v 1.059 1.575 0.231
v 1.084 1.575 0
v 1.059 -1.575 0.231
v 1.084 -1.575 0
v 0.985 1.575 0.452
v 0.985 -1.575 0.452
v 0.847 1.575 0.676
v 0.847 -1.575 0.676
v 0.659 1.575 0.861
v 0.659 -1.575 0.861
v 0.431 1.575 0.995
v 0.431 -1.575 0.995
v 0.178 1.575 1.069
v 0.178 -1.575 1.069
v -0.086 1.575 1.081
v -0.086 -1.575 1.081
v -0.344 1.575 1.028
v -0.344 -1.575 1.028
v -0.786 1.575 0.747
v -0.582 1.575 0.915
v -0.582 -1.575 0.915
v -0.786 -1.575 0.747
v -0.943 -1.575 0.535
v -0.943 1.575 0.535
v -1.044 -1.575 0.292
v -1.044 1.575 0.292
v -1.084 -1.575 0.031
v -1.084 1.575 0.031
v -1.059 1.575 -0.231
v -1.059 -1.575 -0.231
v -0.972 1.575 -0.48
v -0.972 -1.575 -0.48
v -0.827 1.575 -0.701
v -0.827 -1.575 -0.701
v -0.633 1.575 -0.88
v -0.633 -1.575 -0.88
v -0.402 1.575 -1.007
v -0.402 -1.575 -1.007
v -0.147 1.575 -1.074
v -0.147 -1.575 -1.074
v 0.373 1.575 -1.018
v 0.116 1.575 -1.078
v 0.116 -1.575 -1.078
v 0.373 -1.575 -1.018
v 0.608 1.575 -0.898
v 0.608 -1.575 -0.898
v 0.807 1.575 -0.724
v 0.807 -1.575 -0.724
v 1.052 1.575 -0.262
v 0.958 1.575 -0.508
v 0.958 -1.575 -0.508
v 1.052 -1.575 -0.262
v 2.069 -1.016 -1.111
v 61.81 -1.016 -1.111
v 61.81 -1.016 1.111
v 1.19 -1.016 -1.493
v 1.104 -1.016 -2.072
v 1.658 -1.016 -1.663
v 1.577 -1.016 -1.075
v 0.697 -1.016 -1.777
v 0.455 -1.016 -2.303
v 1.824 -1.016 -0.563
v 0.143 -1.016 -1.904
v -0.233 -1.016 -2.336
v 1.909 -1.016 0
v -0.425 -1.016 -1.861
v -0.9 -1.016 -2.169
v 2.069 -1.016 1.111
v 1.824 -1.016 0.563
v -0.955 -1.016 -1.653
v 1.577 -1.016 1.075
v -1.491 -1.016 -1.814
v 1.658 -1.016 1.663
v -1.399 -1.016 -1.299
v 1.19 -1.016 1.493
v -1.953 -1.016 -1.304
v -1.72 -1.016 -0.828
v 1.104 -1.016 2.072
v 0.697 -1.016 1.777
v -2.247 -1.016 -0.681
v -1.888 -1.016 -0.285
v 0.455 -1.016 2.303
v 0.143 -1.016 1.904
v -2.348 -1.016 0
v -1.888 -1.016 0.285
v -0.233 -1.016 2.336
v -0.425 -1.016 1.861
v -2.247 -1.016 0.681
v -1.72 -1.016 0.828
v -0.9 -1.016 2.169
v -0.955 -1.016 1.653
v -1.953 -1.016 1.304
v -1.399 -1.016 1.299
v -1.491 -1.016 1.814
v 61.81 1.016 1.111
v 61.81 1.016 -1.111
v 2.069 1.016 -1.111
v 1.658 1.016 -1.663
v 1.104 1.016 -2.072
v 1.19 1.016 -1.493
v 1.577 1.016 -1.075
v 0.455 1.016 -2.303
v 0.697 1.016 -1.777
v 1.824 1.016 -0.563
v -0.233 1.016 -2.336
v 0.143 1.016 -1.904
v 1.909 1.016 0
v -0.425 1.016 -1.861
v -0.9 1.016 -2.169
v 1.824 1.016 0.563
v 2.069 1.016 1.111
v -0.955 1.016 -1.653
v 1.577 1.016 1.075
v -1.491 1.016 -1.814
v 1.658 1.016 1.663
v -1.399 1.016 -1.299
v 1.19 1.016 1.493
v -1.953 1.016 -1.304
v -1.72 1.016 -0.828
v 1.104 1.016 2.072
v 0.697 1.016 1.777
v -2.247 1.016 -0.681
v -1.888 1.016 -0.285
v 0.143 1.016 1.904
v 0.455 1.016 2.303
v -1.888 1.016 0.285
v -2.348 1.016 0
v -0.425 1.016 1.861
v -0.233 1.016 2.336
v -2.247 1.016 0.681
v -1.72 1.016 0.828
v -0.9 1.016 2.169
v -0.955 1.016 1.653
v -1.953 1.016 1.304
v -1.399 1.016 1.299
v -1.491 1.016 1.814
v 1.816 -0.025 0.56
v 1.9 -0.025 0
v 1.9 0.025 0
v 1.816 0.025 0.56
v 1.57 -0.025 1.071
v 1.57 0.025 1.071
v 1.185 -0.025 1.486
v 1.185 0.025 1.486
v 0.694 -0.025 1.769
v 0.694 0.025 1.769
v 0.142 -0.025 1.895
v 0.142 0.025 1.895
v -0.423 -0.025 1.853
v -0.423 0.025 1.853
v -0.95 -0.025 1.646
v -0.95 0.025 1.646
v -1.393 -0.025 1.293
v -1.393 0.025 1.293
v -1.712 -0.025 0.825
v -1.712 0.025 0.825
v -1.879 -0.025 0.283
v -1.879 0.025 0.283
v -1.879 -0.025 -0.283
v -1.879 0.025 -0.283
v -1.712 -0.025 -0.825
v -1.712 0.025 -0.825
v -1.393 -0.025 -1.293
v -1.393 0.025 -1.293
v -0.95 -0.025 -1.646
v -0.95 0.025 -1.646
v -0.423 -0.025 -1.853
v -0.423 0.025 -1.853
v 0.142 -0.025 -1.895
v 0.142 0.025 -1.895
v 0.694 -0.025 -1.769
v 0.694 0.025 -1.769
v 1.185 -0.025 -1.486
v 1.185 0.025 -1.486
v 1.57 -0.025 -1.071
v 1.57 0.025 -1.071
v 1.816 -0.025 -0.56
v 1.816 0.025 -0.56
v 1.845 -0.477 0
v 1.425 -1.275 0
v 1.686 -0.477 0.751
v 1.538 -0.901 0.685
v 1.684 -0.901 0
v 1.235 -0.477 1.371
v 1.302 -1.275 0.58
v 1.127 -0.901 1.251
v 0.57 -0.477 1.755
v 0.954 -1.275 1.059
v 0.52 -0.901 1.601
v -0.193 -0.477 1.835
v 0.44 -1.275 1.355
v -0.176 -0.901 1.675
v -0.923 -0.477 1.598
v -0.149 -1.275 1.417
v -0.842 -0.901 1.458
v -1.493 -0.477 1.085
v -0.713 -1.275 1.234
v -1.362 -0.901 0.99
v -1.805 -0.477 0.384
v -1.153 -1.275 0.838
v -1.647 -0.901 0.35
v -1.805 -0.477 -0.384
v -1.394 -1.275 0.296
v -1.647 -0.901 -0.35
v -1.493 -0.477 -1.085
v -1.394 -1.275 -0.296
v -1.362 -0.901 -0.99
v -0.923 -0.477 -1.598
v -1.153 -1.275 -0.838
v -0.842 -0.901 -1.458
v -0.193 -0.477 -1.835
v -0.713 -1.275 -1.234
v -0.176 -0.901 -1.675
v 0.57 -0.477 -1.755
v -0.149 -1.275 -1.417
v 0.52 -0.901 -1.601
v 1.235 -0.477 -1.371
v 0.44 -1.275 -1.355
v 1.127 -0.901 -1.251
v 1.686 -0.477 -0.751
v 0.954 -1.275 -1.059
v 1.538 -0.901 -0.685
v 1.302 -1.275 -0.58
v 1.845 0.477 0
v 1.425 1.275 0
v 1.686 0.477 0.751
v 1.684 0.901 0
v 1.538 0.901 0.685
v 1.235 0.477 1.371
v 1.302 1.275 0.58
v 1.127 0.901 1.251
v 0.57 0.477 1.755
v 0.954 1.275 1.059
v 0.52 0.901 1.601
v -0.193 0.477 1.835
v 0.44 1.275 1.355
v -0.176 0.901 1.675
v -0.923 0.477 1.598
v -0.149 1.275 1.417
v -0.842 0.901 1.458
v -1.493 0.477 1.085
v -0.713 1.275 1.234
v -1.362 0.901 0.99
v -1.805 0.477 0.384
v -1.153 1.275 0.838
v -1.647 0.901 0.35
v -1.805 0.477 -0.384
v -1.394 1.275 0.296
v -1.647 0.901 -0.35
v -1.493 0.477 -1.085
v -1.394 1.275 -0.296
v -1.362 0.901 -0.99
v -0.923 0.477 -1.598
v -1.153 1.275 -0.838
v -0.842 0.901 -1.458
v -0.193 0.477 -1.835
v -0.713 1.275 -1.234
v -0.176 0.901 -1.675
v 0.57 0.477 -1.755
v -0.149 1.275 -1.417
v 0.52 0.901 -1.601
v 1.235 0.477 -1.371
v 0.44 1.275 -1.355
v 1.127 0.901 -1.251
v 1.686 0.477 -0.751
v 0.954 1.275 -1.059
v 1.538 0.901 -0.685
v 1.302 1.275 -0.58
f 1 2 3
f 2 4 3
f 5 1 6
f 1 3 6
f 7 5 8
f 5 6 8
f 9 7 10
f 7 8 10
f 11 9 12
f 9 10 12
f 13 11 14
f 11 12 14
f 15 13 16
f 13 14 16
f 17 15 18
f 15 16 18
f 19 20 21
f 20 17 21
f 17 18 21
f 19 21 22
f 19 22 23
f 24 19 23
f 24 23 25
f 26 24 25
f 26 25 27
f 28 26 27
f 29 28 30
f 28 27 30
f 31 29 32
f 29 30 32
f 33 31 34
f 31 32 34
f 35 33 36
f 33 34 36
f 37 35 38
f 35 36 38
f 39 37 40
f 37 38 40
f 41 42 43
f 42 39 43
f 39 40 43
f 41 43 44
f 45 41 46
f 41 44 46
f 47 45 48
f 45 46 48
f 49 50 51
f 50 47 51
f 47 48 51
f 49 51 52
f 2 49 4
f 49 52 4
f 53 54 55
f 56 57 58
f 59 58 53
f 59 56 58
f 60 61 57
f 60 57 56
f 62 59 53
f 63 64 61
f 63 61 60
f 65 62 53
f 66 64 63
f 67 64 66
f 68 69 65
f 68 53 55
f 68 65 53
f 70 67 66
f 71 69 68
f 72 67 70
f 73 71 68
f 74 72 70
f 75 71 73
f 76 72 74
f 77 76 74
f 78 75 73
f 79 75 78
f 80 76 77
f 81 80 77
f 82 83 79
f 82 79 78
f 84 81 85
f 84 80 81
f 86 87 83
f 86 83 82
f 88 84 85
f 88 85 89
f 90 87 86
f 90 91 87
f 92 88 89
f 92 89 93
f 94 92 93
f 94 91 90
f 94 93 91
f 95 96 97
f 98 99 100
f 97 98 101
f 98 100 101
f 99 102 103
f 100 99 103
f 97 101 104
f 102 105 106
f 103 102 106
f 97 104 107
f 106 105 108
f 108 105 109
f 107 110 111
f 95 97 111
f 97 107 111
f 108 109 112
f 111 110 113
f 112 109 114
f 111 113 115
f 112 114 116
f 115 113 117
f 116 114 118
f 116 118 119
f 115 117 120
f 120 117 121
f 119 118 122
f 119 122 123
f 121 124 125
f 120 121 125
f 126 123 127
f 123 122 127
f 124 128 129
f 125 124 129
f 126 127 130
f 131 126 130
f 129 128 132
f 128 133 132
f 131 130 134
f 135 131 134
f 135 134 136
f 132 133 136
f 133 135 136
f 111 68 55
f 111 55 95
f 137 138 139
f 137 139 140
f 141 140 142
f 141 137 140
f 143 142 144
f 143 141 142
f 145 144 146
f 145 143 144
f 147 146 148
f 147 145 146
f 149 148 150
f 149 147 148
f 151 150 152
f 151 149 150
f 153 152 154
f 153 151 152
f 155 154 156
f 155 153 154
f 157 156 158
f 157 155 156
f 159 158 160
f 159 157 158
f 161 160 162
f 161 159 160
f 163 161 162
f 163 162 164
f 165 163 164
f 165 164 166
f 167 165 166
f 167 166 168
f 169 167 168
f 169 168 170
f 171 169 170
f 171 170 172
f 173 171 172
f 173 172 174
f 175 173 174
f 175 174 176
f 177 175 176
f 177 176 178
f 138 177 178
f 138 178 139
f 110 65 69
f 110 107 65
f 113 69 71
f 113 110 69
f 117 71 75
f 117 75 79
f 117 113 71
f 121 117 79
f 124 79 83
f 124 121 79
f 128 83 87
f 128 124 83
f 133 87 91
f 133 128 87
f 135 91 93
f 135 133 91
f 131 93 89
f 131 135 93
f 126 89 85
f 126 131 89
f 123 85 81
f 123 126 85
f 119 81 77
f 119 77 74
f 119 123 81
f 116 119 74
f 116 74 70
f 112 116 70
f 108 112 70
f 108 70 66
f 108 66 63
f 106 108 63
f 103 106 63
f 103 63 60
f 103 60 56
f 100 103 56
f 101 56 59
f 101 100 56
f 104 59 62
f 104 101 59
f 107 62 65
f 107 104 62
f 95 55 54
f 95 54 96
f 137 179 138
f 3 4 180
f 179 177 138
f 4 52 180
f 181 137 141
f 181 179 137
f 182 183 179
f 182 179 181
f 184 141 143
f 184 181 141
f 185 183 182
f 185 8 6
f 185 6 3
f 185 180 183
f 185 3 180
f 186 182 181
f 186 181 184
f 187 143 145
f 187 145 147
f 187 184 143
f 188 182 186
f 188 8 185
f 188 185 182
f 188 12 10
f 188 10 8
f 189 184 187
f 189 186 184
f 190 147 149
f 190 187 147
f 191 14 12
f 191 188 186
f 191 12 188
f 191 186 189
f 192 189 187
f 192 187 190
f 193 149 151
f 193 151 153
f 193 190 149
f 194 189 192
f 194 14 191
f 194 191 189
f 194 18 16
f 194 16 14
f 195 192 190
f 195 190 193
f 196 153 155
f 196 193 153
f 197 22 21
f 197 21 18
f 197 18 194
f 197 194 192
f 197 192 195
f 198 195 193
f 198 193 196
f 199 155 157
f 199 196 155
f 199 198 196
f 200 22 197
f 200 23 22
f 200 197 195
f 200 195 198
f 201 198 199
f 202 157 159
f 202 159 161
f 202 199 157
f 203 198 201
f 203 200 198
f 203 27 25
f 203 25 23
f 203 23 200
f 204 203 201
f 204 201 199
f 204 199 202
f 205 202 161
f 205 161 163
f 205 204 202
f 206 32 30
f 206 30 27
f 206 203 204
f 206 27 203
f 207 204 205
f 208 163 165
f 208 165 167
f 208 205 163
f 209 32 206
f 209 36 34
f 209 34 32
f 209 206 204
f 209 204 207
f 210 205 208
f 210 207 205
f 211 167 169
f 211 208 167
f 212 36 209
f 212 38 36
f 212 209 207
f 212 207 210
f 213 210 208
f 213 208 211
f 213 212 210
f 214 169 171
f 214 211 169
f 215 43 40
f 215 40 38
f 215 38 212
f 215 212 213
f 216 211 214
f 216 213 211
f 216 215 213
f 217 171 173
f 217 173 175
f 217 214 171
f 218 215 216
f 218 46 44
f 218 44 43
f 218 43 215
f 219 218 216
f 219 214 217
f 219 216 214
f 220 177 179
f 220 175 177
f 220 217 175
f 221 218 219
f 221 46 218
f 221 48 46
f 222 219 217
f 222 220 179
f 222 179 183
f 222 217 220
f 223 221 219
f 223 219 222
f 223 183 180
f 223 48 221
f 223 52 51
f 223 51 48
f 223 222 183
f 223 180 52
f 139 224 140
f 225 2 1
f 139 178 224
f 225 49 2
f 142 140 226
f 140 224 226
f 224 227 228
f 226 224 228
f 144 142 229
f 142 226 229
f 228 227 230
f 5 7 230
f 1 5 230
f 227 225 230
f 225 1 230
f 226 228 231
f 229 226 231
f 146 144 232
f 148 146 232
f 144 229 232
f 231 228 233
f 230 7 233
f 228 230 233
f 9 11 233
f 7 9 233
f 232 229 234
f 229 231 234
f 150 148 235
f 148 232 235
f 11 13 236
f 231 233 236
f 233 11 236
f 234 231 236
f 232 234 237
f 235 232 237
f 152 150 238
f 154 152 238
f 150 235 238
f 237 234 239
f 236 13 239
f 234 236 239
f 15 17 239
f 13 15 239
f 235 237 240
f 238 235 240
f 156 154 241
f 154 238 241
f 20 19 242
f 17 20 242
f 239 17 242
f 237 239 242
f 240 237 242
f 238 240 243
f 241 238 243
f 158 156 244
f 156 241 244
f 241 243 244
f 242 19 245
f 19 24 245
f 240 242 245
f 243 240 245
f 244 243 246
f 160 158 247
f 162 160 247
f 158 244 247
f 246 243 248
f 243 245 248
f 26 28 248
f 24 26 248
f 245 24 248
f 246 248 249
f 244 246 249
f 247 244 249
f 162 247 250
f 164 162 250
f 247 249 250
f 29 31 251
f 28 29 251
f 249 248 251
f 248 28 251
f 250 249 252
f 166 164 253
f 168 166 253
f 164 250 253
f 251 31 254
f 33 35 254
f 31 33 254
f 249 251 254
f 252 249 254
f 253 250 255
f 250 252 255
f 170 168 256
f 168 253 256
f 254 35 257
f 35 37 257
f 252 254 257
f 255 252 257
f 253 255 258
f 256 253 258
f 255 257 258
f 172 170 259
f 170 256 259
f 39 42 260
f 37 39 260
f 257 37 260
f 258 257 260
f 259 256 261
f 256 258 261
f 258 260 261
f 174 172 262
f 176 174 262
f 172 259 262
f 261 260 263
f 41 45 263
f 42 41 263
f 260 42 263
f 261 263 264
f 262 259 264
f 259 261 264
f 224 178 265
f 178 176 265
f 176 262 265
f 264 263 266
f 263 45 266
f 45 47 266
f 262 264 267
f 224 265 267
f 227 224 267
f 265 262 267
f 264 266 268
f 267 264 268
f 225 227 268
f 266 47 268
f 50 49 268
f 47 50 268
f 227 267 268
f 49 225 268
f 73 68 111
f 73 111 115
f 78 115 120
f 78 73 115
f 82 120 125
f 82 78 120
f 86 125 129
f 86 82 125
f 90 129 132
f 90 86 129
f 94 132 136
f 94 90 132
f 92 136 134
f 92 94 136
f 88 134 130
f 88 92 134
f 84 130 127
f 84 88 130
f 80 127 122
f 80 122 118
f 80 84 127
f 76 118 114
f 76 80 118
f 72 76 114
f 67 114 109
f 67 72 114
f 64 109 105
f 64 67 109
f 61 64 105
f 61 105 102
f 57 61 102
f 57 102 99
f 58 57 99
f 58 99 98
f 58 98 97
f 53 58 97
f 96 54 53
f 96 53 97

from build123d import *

# Parameters (mm, degrees)
F0_R          = 1.9004449212
F1_DEPTH      = 1.905
F1_DEPTH_BACK = 1.905
F2_R          = 1.8796
F3_R          = 1.0840595421
F4_DEPTH      = 1.905
F4_DEPTH_BACK = 1.905
F5_R          = 2.348007006
F5_R_2        = 1.9090894229
F6_DEPTH      = 1.016
F6_DEPTH_BACK = 1.016
F8_DEPTH      = 2.032
F9_W          = 2.032
F9_H          = 2.221398754
F10_DEPTH     = 55.88


with BuildPart() as f1:
    # F0 (on Front) → F1 (new body, two sides)
    with BuildSketch(Plane.XZ) as f1_sk:
        Circle(F0_R)
    extrude(amount=F1_DEPTH)
    extrude(f1_sk.sketch, amount=-F1_DEPTH_BACK)

    # F2
    f2_edges = [f1.edges().sort_by_distance(p)[0] for p in [
        (-1.900445, -1.905, 0),
        (-1.900445, 1.905, 0),
    ]]
    fillet(f2_edges, radius=F2_R)

    # F3 (on Front) → F4 (cut, two sides)
    with BuildSketch(Plane.XZ) as f4_sk:
        Circle(F3_R)
    extrude(amount=-F4_DEPTH, mode=Mode.SUBTRACT)
    extrude(f4_sk.sketch, amount=F4_DEPTH_BACK, mode=Mode.SUBTRACT)


with BuildPart() as f6:
    # F5 (on Front) → F6 (new body, two sides)
    with BuildSketch(Plane.XZ) as f6_sk:
        Circle(F5_R)
        Circle(F5_R_2, mode=Mode.SUBTRACT)
    extrude(amount=F6_DEPTH)
    extrude(f6_sk.sketch, amount=-F6_DEPTH_BACK)

    # F7 (on face) → F8 (join)
    with BuildSketch(Plane.XZ.offset(1.016)):
        with BuildLine():
            Line((2.068691324, -1.110699377), (5.9301392175, -1.110699377))
            Line((5.9301392175, -1.110699377), (5.9301392175, 1.110699377))
            Line((5.9301392175, 1.110699377), (2.068691324, 1.110699377))
            ThreePointArc((2.068691324, 1.110699377), (2.2771076635, 0.5726408902), (2.348007006, 0))
            ThreePointArc((2.348007006, 0), (2.2771076635, -0.5726408902), (2.068691324, -1.110699377))
        make_face()
        with BuildLine():
            Line((2.0119971596, -1.110699377), (2.068691324, -1.110699377))
            ThreePointArc((2.068691324, -1.110699377), (2.2771076635, -0.5726408902), (2.348007006, 0))
            ThreePointArc((2.348007006, 0), (2.2771076635, 0.5726408902), (2.068691324, 1.110699377))
            Line((2.068691324, 1.110699377), (2.0119971596, 1.110699377))
            Line((2.0119971596, 1.110699377), (2.0119971596, -1.110699377))
        make_face()
    extrude(amount=-F8_DEPTH)

    # F9 (on face) → F10 (join)
    with BuildSketch(Plane.YZ.offset(5.9301392175)):
        Rectangle(F9_W, F9_H)
    extrude(amount=F10_DEPTH)


solid = Compound([f1.part, f6.part])
